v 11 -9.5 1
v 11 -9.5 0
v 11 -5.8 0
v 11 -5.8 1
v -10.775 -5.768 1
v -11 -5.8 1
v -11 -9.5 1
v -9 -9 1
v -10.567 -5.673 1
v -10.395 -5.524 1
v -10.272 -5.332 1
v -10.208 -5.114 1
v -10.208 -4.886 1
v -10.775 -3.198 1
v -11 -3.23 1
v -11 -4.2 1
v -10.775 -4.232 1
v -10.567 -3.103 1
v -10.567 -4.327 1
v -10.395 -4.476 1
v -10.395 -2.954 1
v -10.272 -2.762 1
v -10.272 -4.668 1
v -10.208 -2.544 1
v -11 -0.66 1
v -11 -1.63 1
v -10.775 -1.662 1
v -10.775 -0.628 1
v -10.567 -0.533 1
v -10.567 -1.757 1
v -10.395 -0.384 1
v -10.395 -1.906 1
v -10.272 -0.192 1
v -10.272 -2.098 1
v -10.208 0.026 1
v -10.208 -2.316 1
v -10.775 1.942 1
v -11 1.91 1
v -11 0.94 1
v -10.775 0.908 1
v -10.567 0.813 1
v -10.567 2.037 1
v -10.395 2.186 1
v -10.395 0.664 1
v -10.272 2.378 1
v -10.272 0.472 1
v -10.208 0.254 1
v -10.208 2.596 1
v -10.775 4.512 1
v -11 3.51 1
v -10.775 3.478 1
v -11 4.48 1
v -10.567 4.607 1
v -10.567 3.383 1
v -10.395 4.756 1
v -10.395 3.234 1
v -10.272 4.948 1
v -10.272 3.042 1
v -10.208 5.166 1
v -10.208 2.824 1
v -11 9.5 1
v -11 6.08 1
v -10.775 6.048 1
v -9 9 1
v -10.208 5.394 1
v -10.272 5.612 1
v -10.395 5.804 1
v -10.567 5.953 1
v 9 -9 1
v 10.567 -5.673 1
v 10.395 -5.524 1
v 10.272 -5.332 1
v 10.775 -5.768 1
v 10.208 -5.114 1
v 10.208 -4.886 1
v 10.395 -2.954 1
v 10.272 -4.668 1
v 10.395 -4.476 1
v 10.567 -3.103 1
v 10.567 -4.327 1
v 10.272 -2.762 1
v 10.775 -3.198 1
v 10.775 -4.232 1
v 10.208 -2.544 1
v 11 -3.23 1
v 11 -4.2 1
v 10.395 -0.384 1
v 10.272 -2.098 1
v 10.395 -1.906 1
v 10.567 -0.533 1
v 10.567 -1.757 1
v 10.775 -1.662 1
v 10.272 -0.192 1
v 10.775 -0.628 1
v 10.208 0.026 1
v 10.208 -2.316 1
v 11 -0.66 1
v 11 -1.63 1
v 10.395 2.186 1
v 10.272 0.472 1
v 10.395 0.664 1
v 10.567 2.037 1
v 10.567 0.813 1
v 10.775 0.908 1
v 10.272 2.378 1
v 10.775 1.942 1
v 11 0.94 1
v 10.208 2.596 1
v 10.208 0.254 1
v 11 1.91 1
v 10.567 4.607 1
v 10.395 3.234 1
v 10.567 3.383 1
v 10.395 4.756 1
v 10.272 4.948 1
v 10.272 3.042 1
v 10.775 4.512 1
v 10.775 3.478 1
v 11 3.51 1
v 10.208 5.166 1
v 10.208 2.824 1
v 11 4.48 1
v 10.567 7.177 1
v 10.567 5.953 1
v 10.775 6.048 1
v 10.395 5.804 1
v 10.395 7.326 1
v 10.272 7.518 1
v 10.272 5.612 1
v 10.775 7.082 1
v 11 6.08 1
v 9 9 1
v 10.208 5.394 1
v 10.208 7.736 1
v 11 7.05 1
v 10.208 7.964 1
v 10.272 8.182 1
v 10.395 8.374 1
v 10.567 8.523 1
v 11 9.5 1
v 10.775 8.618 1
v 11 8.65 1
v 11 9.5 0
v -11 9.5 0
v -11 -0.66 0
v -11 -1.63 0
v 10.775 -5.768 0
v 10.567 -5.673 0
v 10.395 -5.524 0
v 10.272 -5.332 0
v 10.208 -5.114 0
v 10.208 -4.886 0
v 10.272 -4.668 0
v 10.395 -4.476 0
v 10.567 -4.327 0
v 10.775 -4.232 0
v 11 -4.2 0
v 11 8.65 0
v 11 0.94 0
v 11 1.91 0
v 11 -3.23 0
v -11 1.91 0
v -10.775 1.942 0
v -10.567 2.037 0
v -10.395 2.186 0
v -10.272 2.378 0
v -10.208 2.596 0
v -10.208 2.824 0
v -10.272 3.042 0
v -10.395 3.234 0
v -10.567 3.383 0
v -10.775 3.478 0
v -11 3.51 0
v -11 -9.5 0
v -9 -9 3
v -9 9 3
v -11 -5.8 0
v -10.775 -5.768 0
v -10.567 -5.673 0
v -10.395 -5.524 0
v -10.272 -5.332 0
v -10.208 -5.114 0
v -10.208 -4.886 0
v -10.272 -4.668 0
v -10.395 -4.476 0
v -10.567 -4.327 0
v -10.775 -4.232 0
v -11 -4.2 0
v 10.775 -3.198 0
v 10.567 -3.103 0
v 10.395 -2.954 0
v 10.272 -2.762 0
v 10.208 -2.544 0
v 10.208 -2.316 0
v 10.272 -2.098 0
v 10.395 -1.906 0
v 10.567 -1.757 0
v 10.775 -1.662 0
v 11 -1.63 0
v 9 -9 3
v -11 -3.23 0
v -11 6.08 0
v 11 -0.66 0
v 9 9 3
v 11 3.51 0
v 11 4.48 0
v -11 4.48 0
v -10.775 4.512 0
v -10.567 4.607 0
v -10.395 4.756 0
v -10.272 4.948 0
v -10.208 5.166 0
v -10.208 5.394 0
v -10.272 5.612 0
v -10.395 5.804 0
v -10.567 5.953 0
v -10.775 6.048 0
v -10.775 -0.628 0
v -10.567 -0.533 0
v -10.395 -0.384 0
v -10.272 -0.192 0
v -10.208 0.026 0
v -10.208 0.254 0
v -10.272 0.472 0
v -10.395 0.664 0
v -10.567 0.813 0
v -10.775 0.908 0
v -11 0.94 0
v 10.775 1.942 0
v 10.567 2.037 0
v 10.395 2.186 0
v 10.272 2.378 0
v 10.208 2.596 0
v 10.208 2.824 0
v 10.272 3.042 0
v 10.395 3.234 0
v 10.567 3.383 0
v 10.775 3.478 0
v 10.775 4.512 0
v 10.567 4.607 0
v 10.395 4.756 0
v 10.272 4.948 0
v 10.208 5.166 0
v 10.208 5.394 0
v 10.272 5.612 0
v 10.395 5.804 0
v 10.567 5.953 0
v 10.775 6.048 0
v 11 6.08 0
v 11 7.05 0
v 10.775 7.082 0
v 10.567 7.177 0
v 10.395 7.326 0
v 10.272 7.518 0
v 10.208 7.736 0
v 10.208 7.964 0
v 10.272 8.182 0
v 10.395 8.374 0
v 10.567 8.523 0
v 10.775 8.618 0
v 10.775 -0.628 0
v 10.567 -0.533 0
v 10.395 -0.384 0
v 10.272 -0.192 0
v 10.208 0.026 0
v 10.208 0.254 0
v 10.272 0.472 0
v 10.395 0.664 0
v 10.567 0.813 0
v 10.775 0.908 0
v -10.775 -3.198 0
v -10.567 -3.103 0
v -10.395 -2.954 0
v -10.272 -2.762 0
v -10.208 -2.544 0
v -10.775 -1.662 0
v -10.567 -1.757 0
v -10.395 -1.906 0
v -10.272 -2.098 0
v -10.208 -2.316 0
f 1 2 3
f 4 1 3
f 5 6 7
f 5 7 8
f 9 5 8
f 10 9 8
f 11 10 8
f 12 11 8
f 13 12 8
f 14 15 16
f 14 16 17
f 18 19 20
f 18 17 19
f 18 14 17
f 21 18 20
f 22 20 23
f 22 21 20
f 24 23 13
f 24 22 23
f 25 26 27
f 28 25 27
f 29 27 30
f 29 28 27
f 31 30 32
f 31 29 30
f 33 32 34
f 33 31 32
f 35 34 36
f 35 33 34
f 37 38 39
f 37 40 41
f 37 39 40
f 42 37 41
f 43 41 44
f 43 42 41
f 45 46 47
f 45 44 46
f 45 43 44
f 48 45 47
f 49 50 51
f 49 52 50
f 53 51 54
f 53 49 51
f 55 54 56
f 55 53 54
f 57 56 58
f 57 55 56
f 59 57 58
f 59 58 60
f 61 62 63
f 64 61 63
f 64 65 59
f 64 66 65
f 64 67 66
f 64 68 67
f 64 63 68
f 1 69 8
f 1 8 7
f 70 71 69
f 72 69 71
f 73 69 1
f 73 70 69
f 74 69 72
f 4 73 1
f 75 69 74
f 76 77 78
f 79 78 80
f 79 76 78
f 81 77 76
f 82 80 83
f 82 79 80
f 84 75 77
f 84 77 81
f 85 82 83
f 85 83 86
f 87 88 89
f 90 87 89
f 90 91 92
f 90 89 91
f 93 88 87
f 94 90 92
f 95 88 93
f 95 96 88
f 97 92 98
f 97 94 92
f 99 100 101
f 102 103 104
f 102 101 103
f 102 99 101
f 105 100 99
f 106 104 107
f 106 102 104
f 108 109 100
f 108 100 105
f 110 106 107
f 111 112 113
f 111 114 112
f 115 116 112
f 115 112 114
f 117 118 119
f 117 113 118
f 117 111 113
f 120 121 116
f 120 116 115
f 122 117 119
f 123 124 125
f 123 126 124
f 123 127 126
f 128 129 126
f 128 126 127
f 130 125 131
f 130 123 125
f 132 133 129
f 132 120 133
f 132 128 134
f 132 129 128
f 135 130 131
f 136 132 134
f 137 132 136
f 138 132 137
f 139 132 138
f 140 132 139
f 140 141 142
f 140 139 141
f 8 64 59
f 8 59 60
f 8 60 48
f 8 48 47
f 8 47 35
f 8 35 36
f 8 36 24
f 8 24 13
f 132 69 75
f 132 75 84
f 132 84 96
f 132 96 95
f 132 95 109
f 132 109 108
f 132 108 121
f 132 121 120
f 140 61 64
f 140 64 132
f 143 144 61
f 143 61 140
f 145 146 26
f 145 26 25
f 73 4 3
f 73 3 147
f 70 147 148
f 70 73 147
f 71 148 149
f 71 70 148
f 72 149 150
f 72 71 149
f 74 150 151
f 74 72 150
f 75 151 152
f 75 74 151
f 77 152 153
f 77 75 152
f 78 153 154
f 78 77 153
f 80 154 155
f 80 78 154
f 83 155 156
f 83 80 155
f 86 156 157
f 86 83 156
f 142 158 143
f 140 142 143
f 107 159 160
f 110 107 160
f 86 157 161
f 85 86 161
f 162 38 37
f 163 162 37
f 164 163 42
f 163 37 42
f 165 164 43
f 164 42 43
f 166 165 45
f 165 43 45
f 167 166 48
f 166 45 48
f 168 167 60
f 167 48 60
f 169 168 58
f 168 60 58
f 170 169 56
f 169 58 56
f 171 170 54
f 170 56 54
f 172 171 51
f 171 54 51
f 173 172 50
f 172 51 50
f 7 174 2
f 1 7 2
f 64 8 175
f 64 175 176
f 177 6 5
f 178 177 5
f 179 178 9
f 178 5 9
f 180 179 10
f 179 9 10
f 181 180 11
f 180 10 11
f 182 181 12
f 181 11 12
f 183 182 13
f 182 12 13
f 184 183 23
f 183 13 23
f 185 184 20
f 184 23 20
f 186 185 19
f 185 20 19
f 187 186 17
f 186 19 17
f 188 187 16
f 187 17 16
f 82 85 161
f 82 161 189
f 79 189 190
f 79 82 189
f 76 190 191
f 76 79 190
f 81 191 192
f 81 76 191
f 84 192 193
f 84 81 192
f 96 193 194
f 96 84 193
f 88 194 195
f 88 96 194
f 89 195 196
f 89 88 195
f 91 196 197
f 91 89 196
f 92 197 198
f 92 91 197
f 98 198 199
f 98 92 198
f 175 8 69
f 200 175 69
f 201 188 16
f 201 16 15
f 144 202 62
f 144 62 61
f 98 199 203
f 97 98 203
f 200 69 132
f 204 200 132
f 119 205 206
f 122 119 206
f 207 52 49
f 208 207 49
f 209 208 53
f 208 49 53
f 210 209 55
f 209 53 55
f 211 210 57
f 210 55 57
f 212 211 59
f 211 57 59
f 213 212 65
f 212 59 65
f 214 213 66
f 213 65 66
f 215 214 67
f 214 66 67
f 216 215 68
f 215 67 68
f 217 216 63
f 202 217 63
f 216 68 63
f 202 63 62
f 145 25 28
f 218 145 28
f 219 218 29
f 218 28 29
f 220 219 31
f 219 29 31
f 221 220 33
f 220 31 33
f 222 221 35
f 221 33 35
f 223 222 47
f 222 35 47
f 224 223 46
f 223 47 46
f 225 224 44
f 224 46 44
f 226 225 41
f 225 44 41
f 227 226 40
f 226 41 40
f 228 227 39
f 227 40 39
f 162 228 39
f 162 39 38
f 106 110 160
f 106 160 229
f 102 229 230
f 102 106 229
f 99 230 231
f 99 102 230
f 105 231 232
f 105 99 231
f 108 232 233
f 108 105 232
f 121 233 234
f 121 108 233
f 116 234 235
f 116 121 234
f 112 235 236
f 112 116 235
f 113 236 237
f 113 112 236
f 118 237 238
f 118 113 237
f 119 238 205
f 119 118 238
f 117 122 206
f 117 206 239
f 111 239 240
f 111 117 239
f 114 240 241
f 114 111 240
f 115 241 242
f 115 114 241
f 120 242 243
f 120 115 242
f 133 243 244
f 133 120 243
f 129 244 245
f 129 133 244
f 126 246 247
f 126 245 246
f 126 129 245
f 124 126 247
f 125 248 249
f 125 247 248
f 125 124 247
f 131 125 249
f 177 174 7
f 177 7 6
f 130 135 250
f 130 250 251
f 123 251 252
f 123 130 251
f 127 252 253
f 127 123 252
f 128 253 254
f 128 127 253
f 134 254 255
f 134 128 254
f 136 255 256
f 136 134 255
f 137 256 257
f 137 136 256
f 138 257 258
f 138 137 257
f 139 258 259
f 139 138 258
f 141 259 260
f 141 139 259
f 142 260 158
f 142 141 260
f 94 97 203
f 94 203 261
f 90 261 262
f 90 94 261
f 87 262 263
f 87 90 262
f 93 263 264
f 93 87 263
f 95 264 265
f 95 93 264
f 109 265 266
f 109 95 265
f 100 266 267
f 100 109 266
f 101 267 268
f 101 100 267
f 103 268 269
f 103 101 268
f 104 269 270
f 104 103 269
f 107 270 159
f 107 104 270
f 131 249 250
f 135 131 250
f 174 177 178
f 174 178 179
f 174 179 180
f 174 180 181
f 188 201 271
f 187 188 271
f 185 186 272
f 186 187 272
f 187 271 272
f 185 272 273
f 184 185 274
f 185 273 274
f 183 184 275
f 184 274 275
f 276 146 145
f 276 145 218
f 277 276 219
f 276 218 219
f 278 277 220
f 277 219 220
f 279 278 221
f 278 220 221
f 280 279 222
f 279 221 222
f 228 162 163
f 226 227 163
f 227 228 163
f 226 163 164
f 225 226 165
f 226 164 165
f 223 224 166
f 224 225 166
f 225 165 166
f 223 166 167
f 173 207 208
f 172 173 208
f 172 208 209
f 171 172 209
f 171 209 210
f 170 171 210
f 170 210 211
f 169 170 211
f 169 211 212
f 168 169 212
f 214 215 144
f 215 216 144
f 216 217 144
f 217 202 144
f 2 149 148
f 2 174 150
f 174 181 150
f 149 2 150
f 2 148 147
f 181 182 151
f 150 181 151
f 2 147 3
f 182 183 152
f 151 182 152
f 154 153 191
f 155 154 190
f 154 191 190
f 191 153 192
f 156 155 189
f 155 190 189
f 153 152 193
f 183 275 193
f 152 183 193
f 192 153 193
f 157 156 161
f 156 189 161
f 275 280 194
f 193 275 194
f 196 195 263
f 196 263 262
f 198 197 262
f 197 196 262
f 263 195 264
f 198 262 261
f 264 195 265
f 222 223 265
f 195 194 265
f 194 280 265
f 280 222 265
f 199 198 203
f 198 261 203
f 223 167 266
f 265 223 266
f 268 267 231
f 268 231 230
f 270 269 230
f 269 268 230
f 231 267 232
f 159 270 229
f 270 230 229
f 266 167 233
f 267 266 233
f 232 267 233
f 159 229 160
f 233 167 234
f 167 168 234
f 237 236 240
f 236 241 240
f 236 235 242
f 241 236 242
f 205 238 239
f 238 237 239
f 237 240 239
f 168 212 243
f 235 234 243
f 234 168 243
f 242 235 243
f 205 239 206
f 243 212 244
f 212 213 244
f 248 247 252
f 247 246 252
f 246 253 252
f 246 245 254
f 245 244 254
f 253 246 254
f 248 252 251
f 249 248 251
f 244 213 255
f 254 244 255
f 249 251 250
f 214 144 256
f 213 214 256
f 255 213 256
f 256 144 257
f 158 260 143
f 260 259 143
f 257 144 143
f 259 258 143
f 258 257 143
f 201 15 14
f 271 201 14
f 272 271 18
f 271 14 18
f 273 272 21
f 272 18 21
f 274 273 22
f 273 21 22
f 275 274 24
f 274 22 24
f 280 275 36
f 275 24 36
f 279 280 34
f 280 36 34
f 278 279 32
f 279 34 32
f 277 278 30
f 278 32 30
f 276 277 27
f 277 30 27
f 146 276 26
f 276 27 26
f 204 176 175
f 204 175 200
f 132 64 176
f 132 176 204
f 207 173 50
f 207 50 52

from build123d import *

# Parameters (mm, degrees)
SKETCH_1_W          = 22
SKETCH_1_H          = 19
EXTRUDE_1_DEPTH     = 1
SKETCH_2_W          = 18
SKETCH_2_H          = 18
EXTRUDE_2_DEPTH     = 2
CUT_EXTRUDE_1_DEPTH = 4


with BuildPart() as part:
    # Эскиз1 → Бобышка-Вытянуть1 (new body)
    with BuildSketch(Plane.XY):
        Rectangle(SKETCH_1_W, SKETCH_1_H)
    extrude(amount=EXTRUDE_1_DEPTH)

    # Эскиз2 → Бобышка-Вытянуть2 (add)
    with BuildSketch(Plane.XY.offset(1)):
        Rectangle(SKETCH_2_W, SKETCH_2_H)
    extrude(amount=EXTRUDE_2_DEPTH)

    # Эскиз3 → Вырез-Вытянуть1 (cut, through all)
    with BuildSketch(Plane.XY.offset(3)):
        with BuildLine():
            Line((-11, -4.2), (-11, -5.8))
            ThreePointArc((-11, -5.8), (-10.2, -5), (-11, -4.2))
        make_face()
        with BuildLine():
            Line((-11, -1.63), (-11, -3.23))
            ThreePointArc((-11, -3.23), (-10.2, -2.43), (-11, -1.63))
        make_face()
        with BuildLine():
            Line((-11, 0.94), (-11, -0.66))
            ThreePointArc((-11, -0.66), (-10.2, 0.14), (-11, 0.94))
        make_face()
        with BuildLine():
            Line((-11, 3.51), (-11, 1.91))
            ThreePointArc((-11, 1.91), (-10.2, 2.71), (-11, 3.51))
        make_face()
        with BuildLine():
            Line((-11, 6.08), (-11, 4.48))
            ThreePointArc((-11, 4.48), (-10.2, 5.28), (-11, 6.08))
        make_face()
        with BuildLine():
            Line((11, -4.2), (11, -5.8))
            ThreePointArc((11, -5.8), (10.2, -5), (11, -4.2))
        make_face()
        with BuildLine():
            Line((11, -1.63), (11, -3.23))
            ThreePointArc((11, -3.23), (10.2, -2.43), (11, -1.63))
        make_face()
        with BuildLine():
            Line((11, 0.94), (11, -0.66))
            ThreePointArc((11, -0.66), (10.2, 0.14), (11, 0.94))
        make_face()
        with BuildLine():
            Line((11, 3.51), (11, 1.91))
            ThreePointArc((11, 1.91), (10.2, 2.71), (11, 3.51))
        make_face()
        with BuildLine():
            Line((11, 6.08), (11, 4.48))
            ThreePointArc((11, 4.48), (10.2, 5.28), (11, 6.08))
        make_face()
        with BuildLine():
            Line((11, 8.65), (11, 7.05))
            ThreePointArc((11, 7.05), (10.2, 7.85), (11, 8.65))
        make_face()
    extrude(amount=-CUT_EXTRUDE_1_DEPTH, mode=Mode.SUBTRACT)


solid = part.part
